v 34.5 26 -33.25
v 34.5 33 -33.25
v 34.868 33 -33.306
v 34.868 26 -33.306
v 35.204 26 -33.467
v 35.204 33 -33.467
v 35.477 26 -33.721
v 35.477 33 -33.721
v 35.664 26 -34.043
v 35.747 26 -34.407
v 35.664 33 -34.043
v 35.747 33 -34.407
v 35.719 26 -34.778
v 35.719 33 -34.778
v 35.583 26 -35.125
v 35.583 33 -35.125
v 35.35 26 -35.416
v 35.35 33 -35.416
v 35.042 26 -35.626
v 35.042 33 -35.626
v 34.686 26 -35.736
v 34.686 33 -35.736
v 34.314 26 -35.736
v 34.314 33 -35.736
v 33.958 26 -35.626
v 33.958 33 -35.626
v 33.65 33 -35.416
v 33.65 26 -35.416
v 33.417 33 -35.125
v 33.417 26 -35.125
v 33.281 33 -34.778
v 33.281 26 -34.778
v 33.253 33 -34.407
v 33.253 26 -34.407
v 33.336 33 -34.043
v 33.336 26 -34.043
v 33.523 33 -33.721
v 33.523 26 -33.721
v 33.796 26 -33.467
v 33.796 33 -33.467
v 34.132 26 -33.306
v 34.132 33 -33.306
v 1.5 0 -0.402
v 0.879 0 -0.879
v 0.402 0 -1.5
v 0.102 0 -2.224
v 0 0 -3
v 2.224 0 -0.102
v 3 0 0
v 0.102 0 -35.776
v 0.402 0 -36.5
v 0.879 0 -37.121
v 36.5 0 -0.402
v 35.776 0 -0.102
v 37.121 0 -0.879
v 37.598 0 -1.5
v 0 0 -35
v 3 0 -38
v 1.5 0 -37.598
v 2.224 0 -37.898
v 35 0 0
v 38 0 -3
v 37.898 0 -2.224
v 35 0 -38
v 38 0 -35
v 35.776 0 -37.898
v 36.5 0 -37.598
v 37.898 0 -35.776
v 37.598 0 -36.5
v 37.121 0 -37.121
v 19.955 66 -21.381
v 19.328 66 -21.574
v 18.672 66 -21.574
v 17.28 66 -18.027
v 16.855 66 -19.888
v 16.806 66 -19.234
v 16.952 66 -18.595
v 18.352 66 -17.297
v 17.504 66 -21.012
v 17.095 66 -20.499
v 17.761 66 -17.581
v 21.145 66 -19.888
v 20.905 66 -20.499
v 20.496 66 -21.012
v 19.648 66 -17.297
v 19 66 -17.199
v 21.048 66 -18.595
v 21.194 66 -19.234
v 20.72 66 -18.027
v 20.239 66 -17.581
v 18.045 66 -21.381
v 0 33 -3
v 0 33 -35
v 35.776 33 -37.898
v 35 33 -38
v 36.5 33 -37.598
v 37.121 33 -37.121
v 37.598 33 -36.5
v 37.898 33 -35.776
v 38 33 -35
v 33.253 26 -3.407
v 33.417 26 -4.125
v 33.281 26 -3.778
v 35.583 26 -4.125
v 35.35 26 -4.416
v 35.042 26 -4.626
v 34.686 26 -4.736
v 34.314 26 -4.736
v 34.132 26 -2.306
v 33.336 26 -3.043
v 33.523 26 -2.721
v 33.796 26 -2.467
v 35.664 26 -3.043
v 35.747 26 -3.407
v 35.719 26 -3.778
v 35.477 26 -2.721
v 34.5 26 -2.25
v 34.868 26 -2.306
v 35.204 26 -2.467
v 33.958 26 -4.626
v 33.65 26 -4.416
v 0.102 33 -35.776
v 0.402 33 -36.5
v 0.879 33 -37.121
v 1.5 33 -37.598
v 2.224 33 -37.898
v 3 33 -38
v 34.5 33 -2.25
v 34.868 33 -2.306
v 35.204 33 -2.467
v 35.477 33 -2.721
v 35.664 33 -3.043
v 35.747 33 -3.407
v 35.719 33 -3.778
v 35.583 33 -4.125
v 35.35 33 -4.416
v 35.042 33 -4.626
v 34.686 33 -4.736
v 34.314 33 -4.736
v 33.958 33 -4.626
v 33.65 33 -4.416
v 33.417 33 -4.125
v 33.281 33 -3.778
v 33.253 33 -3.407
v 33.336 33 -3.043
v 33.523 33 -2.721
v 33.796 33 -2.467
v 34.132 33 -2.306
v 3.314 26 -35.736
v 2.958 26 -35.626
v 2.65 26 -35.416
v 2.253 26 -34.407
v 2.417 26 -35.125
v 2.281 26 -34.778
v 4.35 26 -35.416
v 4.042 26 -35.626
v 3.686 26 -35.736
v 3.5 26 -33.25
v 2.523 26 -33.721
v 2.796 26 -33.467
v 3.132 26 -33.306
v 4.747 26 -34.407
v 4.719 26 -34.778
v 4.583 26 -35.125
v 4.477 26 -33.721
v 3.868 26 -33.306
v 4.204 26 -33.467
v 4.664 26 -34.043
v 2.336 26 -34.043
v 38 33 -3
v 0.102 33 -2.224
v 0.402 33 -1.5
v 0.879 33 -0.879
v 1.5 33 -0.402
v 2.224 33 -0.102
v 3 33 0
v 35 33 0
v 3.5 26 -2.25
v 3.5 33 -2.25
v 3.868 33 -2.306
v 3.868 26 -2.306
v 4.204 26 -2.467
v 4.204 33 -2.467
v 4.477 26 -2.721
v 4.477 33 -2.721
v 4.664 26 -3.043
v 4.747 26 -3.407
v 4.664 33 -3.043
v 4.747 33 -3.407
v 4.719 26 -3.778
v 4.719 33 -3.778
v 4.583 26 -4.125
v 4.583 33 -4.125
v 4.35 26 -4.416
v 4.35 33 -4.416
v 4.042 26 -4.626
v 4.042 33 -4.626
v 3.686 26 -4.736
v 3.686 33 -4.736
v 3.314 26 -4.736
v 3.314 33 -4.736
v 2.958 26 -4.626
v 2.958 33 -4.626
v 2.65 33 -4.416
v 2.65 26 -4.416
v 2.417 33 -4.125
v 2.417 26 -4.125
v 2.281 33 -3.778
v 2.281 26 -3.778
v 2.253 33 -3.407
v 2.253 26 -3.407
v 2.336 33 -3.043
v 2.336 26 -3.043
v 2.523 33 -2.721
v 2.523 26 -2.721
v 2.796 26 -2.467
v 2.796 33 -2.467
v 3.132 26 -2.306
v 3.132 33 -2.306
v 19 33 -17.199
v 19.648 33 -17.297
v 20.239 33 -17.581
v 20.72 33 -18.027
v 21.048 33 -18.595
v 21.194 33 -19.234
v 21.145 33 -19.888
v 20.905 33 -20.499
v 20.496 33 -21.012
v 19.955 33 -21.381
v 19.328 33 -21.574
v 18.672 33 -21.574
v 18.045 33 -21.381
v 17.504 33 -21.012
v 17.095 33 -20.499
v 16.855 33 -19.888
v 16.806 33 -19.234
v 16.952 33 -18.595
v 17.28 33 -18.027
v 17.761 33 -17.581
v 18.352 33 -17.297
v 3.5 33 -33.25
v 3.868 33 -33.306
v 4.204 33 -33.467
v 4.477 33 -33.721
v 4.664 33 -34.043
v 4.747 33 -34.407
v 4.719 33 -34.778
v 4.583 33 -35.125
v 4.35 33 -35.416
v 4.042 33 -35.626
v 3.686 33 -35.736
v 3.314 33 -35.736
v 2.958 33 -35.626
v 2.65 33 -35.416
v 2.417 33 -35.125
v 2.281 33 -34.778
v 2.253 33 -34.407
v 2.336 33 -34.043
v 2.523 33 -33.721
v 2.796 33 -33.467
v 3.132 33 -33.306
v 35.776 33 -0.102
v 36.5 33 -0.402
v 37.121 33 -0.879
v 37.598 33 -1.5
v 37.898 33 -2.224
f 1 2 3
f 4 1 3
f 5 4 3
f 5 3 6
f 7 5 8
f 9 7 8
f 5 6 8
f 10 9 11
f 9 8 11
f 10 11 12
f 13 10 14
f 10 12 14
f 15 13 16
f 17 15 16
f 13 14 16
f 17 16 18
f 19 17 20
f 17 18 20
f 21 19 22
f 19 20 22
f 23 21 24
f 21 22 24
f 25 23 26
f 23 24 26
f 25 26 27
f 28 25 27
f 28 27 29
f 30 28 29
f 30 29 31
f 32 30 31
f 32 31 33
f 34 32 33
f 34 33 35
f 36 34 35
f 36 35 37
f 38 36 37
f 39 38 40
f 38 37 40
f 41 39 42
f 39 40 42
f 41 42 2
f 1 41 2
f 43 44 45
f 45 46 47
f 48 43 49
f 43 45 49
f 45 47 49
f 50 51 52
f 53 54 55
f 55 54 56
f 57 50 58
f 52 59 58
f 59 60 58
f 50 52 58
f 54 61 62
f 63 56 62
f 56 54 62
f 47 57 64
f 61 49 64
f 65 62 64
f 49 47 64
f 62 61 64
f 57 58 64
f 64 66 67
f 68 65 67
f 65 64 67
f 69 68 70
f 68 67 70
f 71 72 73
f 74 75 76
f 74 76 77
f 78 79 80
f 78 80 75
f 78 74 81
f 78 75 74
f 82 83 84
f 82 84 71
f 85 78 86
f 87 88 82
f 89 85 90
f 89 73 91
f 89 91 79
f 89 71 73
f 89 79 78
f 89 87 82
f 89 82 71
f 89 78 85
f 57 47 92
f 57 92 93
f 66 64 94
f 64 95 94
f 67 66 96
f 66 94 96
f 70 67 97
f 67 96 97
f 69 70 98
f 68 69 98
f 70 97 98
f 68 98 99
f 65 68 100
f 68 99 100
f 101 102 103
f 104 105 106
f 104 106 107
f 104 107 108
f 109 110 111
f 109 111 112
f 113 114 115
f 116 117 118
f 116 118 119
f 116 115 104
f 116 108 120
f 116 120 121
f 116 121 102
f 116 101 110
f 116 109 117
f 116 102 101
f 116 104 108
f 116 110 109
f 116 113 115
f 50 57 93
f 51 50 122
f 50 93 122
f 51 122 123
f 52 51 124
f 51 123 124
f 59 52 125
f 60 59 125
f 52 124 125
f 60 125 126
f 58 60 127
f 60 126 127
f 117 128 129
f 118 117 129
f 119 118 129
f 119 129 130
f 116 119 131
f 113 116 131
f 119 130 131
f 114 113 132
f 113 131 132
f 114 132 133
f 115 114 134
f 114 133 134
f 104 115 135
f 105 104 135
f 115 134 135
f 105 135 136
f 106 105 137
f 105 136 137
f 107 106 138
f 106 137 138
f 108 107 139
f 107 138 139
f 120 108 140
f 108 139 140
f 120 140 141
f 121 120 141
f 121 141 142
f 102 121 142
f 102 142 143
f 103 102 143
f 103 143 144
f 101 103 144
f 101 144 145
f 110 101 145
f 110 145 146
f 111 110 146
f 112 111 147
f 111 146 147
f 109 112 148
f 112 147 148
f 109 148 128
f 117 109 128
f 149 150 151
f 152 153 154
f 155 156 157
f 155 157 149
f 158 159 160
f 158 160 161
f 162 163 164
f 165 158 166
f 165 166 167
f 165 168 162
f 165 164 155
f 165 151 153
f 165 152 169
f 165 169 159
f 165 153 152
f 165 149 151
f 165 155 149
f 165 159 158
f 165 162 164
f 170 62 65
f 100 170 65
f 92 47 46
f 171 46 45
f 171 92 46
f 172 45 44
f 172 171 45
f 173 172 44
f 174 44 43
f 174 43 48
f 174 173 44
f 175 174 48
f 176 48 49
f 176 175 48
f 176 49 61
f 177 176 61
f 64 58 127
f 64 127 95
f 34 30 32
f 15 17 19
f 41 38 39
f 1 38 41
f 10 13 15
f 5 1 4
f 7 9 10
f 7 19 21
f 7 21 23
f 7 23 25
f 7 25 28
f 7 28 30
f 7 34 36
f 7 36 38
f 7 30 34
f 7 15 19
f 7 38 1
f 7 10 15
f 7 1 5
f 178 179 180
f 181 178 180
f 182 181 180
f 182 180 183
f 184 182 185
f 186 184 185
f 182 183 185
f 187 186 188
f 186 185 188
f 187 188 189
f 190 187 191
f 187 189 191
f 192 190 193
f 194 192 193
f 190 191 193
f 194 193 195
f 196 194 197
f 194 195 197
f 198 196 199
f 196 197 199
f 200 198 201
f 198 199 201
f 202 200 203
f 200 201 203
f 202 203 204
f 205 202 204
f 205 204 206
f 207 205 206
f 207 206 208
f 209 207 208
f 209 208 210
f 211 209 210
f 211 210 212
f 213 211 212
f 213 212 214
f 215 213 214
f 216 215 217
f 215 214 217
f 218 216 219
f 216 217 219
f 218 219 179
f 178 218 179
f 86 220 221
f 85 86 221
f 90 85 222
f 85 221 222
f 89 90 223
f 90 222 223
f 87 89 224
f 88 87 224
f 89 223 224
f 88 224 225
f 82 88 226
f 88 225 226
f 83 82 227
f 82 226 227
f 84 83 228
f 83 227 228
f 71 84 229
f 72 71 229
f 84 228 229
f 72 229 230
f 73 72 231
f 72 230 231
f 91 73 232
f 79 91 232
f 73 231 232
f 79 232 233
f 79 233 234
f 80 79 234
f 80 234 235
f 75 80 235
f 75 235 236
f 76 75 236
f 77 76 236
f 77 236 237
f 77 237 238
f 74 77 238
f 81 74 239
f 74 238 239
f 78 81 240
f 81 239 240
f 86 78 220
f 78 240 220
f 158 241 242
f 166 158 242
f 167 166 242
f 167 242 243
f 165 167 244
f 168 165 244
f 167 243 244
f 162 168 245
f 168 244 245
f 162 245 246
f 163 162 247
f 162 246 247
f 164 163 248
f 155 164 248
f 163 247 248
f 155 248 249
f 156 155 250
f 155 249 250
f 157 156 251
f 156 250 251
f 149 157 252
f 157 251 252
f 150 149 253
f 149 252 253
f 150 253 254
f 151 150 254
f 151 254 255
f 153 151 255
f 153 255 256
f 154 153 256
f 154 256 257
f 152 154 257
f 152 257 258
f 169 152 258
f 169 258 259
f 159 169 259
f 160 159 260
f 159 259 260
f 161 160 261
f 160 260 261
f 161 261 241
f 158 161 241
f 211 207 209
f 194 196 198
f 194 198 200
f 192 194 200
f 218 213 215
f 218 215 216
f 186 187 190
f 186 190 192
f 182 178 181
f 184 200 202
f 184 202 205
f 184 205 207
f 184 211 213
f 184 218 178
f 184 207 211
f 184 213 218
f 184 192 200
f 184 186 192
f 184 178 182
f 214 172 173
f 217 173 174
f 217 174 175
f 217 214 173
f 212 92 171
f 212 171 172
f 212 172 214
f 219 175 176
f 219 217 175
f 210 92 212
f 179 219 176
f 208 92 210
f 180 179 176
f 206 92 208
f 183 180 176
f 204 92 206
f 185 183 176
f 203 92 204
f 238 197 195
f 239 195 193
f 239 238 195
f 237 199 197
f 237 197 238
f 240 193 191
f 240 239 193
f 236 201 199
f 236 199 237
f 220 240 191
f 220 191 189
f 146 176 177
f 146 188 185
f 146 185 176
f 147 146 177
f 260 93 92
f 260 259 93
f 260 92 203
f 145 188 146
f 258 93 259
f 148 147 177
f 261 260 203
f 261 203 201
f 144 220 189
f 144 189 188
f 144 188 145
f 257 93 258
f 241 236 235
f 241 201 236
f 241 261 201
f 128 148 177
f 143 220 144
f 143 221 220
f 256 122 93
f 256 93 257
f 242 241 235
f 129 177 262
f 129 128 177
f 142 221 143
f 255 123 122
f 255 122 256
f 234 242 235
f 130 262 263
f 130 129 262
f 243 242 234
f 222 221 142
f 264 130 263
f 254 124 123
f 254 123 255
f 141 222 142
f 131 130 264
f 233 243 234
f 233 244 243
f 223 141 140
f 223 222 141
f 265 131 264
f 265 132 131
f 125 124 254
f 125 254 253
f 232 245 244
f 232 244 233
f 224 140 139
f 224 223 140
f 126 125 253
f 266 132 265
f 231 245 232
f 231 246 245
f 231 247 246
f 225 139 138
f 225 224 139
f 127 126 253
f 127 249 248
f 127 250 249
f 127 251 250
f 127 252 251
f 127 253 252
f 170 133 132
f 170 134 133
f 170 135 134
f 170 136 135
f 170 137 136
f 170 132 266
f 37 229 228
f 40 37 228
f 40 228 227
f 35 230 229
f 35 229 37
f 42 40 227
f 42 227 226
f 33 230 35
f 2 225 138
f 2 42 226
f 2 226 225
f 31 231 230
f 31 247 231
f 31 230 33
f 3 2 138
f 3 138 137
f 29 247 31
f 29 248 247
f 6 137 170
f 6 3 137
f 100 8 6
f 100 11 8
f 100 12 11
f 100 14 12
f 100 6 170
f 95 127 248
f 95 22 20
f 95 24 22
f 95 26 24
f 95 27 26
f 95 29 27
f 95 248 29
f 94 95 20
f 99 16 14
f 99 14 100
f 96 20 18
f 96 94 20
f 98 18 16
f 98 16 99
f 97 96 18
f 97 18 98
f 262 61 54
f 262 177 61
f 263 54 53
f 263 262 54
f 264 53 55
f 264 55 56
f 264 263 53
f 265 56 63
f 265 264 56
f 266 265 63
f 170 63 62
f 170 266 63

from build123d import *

# Parameters (mm, degrees)
SKETCH1_W           = 38
SKETCH1_H           = 38
BOSS_EXTRUDE1_DEPTH = 33
SKETCH2_R           = 2.2
BOSS_EXTRUDE2_DEPTH = 33
FILLET1_R           = 3
SKETCH3_R           = 1.25
CUT_EXTRUDE1_DEPTH  = 7


with BuildPart() as part:
    # Sketch1 → Boss-Extrude1 (new body)
    with BuildSketch(Plane(origin=(0, 0, 0), x_dir=(1, 0, 0), z_dir=(0, 1, 0))):
        with Locations((19, 19)):
            Rectangle(SKETCH1_W, SKETCH1_H)
    extrude(amount=BOSS_EXTRUDE1_DEPTH)

    # Sketch2 → Boss-Extrude2 (add)
    with BuildSketch(Plane(origin=(0, 33, 0), x_dir=(1, 0, 0), z_dir=(0, 1, 0))):
        with Locations(Location((19, 19.398847775, 0), (0, 0, 270))):
            Circle(SKETCH2_R)
    extrude(amount=BOSS_EXTRUDE2_DEPTH)

    # Fillet1
    fillet1_edges = [part.edges().sort_by_distance(p)[0] for p in [
        (38, 16.5, -38),
        (38, 16.5, 0),
        (0, 16.5, 0),
        (0, 16.5, -38),
    ]]
    fillet(fillet1_edges, radius=FILLET1_R)

    # Sketch3 → Cut-Extrude1 (cut)
    with BuildSketch(Plane(origin=(0, 33, 0), x_dir=(1, 0, 0), z_dir=(0, 1, 0))):
        with Locations(Location((3.5, 34.5, 0), (0, 0, 270))):
            Circle(SKETCH3_R)
        with Locations(Location((3.5, 3.5, 0), (0, 0, 270))):
            Circle(SKETCH3_R)
        with Locations(Location((34.5, 3.5, 0), (0, 0, 270))):
            Circle(SKETCH3_R)
        with Locations(Location((34.5, 34.5, 0), (0, 0, 270))):
            Circle(SKETCH3_R)
    extrude(amount=-CUT_EXTRUDE1_DEPTH, mode=Mode.SUBTRACT)


solid = part.part
